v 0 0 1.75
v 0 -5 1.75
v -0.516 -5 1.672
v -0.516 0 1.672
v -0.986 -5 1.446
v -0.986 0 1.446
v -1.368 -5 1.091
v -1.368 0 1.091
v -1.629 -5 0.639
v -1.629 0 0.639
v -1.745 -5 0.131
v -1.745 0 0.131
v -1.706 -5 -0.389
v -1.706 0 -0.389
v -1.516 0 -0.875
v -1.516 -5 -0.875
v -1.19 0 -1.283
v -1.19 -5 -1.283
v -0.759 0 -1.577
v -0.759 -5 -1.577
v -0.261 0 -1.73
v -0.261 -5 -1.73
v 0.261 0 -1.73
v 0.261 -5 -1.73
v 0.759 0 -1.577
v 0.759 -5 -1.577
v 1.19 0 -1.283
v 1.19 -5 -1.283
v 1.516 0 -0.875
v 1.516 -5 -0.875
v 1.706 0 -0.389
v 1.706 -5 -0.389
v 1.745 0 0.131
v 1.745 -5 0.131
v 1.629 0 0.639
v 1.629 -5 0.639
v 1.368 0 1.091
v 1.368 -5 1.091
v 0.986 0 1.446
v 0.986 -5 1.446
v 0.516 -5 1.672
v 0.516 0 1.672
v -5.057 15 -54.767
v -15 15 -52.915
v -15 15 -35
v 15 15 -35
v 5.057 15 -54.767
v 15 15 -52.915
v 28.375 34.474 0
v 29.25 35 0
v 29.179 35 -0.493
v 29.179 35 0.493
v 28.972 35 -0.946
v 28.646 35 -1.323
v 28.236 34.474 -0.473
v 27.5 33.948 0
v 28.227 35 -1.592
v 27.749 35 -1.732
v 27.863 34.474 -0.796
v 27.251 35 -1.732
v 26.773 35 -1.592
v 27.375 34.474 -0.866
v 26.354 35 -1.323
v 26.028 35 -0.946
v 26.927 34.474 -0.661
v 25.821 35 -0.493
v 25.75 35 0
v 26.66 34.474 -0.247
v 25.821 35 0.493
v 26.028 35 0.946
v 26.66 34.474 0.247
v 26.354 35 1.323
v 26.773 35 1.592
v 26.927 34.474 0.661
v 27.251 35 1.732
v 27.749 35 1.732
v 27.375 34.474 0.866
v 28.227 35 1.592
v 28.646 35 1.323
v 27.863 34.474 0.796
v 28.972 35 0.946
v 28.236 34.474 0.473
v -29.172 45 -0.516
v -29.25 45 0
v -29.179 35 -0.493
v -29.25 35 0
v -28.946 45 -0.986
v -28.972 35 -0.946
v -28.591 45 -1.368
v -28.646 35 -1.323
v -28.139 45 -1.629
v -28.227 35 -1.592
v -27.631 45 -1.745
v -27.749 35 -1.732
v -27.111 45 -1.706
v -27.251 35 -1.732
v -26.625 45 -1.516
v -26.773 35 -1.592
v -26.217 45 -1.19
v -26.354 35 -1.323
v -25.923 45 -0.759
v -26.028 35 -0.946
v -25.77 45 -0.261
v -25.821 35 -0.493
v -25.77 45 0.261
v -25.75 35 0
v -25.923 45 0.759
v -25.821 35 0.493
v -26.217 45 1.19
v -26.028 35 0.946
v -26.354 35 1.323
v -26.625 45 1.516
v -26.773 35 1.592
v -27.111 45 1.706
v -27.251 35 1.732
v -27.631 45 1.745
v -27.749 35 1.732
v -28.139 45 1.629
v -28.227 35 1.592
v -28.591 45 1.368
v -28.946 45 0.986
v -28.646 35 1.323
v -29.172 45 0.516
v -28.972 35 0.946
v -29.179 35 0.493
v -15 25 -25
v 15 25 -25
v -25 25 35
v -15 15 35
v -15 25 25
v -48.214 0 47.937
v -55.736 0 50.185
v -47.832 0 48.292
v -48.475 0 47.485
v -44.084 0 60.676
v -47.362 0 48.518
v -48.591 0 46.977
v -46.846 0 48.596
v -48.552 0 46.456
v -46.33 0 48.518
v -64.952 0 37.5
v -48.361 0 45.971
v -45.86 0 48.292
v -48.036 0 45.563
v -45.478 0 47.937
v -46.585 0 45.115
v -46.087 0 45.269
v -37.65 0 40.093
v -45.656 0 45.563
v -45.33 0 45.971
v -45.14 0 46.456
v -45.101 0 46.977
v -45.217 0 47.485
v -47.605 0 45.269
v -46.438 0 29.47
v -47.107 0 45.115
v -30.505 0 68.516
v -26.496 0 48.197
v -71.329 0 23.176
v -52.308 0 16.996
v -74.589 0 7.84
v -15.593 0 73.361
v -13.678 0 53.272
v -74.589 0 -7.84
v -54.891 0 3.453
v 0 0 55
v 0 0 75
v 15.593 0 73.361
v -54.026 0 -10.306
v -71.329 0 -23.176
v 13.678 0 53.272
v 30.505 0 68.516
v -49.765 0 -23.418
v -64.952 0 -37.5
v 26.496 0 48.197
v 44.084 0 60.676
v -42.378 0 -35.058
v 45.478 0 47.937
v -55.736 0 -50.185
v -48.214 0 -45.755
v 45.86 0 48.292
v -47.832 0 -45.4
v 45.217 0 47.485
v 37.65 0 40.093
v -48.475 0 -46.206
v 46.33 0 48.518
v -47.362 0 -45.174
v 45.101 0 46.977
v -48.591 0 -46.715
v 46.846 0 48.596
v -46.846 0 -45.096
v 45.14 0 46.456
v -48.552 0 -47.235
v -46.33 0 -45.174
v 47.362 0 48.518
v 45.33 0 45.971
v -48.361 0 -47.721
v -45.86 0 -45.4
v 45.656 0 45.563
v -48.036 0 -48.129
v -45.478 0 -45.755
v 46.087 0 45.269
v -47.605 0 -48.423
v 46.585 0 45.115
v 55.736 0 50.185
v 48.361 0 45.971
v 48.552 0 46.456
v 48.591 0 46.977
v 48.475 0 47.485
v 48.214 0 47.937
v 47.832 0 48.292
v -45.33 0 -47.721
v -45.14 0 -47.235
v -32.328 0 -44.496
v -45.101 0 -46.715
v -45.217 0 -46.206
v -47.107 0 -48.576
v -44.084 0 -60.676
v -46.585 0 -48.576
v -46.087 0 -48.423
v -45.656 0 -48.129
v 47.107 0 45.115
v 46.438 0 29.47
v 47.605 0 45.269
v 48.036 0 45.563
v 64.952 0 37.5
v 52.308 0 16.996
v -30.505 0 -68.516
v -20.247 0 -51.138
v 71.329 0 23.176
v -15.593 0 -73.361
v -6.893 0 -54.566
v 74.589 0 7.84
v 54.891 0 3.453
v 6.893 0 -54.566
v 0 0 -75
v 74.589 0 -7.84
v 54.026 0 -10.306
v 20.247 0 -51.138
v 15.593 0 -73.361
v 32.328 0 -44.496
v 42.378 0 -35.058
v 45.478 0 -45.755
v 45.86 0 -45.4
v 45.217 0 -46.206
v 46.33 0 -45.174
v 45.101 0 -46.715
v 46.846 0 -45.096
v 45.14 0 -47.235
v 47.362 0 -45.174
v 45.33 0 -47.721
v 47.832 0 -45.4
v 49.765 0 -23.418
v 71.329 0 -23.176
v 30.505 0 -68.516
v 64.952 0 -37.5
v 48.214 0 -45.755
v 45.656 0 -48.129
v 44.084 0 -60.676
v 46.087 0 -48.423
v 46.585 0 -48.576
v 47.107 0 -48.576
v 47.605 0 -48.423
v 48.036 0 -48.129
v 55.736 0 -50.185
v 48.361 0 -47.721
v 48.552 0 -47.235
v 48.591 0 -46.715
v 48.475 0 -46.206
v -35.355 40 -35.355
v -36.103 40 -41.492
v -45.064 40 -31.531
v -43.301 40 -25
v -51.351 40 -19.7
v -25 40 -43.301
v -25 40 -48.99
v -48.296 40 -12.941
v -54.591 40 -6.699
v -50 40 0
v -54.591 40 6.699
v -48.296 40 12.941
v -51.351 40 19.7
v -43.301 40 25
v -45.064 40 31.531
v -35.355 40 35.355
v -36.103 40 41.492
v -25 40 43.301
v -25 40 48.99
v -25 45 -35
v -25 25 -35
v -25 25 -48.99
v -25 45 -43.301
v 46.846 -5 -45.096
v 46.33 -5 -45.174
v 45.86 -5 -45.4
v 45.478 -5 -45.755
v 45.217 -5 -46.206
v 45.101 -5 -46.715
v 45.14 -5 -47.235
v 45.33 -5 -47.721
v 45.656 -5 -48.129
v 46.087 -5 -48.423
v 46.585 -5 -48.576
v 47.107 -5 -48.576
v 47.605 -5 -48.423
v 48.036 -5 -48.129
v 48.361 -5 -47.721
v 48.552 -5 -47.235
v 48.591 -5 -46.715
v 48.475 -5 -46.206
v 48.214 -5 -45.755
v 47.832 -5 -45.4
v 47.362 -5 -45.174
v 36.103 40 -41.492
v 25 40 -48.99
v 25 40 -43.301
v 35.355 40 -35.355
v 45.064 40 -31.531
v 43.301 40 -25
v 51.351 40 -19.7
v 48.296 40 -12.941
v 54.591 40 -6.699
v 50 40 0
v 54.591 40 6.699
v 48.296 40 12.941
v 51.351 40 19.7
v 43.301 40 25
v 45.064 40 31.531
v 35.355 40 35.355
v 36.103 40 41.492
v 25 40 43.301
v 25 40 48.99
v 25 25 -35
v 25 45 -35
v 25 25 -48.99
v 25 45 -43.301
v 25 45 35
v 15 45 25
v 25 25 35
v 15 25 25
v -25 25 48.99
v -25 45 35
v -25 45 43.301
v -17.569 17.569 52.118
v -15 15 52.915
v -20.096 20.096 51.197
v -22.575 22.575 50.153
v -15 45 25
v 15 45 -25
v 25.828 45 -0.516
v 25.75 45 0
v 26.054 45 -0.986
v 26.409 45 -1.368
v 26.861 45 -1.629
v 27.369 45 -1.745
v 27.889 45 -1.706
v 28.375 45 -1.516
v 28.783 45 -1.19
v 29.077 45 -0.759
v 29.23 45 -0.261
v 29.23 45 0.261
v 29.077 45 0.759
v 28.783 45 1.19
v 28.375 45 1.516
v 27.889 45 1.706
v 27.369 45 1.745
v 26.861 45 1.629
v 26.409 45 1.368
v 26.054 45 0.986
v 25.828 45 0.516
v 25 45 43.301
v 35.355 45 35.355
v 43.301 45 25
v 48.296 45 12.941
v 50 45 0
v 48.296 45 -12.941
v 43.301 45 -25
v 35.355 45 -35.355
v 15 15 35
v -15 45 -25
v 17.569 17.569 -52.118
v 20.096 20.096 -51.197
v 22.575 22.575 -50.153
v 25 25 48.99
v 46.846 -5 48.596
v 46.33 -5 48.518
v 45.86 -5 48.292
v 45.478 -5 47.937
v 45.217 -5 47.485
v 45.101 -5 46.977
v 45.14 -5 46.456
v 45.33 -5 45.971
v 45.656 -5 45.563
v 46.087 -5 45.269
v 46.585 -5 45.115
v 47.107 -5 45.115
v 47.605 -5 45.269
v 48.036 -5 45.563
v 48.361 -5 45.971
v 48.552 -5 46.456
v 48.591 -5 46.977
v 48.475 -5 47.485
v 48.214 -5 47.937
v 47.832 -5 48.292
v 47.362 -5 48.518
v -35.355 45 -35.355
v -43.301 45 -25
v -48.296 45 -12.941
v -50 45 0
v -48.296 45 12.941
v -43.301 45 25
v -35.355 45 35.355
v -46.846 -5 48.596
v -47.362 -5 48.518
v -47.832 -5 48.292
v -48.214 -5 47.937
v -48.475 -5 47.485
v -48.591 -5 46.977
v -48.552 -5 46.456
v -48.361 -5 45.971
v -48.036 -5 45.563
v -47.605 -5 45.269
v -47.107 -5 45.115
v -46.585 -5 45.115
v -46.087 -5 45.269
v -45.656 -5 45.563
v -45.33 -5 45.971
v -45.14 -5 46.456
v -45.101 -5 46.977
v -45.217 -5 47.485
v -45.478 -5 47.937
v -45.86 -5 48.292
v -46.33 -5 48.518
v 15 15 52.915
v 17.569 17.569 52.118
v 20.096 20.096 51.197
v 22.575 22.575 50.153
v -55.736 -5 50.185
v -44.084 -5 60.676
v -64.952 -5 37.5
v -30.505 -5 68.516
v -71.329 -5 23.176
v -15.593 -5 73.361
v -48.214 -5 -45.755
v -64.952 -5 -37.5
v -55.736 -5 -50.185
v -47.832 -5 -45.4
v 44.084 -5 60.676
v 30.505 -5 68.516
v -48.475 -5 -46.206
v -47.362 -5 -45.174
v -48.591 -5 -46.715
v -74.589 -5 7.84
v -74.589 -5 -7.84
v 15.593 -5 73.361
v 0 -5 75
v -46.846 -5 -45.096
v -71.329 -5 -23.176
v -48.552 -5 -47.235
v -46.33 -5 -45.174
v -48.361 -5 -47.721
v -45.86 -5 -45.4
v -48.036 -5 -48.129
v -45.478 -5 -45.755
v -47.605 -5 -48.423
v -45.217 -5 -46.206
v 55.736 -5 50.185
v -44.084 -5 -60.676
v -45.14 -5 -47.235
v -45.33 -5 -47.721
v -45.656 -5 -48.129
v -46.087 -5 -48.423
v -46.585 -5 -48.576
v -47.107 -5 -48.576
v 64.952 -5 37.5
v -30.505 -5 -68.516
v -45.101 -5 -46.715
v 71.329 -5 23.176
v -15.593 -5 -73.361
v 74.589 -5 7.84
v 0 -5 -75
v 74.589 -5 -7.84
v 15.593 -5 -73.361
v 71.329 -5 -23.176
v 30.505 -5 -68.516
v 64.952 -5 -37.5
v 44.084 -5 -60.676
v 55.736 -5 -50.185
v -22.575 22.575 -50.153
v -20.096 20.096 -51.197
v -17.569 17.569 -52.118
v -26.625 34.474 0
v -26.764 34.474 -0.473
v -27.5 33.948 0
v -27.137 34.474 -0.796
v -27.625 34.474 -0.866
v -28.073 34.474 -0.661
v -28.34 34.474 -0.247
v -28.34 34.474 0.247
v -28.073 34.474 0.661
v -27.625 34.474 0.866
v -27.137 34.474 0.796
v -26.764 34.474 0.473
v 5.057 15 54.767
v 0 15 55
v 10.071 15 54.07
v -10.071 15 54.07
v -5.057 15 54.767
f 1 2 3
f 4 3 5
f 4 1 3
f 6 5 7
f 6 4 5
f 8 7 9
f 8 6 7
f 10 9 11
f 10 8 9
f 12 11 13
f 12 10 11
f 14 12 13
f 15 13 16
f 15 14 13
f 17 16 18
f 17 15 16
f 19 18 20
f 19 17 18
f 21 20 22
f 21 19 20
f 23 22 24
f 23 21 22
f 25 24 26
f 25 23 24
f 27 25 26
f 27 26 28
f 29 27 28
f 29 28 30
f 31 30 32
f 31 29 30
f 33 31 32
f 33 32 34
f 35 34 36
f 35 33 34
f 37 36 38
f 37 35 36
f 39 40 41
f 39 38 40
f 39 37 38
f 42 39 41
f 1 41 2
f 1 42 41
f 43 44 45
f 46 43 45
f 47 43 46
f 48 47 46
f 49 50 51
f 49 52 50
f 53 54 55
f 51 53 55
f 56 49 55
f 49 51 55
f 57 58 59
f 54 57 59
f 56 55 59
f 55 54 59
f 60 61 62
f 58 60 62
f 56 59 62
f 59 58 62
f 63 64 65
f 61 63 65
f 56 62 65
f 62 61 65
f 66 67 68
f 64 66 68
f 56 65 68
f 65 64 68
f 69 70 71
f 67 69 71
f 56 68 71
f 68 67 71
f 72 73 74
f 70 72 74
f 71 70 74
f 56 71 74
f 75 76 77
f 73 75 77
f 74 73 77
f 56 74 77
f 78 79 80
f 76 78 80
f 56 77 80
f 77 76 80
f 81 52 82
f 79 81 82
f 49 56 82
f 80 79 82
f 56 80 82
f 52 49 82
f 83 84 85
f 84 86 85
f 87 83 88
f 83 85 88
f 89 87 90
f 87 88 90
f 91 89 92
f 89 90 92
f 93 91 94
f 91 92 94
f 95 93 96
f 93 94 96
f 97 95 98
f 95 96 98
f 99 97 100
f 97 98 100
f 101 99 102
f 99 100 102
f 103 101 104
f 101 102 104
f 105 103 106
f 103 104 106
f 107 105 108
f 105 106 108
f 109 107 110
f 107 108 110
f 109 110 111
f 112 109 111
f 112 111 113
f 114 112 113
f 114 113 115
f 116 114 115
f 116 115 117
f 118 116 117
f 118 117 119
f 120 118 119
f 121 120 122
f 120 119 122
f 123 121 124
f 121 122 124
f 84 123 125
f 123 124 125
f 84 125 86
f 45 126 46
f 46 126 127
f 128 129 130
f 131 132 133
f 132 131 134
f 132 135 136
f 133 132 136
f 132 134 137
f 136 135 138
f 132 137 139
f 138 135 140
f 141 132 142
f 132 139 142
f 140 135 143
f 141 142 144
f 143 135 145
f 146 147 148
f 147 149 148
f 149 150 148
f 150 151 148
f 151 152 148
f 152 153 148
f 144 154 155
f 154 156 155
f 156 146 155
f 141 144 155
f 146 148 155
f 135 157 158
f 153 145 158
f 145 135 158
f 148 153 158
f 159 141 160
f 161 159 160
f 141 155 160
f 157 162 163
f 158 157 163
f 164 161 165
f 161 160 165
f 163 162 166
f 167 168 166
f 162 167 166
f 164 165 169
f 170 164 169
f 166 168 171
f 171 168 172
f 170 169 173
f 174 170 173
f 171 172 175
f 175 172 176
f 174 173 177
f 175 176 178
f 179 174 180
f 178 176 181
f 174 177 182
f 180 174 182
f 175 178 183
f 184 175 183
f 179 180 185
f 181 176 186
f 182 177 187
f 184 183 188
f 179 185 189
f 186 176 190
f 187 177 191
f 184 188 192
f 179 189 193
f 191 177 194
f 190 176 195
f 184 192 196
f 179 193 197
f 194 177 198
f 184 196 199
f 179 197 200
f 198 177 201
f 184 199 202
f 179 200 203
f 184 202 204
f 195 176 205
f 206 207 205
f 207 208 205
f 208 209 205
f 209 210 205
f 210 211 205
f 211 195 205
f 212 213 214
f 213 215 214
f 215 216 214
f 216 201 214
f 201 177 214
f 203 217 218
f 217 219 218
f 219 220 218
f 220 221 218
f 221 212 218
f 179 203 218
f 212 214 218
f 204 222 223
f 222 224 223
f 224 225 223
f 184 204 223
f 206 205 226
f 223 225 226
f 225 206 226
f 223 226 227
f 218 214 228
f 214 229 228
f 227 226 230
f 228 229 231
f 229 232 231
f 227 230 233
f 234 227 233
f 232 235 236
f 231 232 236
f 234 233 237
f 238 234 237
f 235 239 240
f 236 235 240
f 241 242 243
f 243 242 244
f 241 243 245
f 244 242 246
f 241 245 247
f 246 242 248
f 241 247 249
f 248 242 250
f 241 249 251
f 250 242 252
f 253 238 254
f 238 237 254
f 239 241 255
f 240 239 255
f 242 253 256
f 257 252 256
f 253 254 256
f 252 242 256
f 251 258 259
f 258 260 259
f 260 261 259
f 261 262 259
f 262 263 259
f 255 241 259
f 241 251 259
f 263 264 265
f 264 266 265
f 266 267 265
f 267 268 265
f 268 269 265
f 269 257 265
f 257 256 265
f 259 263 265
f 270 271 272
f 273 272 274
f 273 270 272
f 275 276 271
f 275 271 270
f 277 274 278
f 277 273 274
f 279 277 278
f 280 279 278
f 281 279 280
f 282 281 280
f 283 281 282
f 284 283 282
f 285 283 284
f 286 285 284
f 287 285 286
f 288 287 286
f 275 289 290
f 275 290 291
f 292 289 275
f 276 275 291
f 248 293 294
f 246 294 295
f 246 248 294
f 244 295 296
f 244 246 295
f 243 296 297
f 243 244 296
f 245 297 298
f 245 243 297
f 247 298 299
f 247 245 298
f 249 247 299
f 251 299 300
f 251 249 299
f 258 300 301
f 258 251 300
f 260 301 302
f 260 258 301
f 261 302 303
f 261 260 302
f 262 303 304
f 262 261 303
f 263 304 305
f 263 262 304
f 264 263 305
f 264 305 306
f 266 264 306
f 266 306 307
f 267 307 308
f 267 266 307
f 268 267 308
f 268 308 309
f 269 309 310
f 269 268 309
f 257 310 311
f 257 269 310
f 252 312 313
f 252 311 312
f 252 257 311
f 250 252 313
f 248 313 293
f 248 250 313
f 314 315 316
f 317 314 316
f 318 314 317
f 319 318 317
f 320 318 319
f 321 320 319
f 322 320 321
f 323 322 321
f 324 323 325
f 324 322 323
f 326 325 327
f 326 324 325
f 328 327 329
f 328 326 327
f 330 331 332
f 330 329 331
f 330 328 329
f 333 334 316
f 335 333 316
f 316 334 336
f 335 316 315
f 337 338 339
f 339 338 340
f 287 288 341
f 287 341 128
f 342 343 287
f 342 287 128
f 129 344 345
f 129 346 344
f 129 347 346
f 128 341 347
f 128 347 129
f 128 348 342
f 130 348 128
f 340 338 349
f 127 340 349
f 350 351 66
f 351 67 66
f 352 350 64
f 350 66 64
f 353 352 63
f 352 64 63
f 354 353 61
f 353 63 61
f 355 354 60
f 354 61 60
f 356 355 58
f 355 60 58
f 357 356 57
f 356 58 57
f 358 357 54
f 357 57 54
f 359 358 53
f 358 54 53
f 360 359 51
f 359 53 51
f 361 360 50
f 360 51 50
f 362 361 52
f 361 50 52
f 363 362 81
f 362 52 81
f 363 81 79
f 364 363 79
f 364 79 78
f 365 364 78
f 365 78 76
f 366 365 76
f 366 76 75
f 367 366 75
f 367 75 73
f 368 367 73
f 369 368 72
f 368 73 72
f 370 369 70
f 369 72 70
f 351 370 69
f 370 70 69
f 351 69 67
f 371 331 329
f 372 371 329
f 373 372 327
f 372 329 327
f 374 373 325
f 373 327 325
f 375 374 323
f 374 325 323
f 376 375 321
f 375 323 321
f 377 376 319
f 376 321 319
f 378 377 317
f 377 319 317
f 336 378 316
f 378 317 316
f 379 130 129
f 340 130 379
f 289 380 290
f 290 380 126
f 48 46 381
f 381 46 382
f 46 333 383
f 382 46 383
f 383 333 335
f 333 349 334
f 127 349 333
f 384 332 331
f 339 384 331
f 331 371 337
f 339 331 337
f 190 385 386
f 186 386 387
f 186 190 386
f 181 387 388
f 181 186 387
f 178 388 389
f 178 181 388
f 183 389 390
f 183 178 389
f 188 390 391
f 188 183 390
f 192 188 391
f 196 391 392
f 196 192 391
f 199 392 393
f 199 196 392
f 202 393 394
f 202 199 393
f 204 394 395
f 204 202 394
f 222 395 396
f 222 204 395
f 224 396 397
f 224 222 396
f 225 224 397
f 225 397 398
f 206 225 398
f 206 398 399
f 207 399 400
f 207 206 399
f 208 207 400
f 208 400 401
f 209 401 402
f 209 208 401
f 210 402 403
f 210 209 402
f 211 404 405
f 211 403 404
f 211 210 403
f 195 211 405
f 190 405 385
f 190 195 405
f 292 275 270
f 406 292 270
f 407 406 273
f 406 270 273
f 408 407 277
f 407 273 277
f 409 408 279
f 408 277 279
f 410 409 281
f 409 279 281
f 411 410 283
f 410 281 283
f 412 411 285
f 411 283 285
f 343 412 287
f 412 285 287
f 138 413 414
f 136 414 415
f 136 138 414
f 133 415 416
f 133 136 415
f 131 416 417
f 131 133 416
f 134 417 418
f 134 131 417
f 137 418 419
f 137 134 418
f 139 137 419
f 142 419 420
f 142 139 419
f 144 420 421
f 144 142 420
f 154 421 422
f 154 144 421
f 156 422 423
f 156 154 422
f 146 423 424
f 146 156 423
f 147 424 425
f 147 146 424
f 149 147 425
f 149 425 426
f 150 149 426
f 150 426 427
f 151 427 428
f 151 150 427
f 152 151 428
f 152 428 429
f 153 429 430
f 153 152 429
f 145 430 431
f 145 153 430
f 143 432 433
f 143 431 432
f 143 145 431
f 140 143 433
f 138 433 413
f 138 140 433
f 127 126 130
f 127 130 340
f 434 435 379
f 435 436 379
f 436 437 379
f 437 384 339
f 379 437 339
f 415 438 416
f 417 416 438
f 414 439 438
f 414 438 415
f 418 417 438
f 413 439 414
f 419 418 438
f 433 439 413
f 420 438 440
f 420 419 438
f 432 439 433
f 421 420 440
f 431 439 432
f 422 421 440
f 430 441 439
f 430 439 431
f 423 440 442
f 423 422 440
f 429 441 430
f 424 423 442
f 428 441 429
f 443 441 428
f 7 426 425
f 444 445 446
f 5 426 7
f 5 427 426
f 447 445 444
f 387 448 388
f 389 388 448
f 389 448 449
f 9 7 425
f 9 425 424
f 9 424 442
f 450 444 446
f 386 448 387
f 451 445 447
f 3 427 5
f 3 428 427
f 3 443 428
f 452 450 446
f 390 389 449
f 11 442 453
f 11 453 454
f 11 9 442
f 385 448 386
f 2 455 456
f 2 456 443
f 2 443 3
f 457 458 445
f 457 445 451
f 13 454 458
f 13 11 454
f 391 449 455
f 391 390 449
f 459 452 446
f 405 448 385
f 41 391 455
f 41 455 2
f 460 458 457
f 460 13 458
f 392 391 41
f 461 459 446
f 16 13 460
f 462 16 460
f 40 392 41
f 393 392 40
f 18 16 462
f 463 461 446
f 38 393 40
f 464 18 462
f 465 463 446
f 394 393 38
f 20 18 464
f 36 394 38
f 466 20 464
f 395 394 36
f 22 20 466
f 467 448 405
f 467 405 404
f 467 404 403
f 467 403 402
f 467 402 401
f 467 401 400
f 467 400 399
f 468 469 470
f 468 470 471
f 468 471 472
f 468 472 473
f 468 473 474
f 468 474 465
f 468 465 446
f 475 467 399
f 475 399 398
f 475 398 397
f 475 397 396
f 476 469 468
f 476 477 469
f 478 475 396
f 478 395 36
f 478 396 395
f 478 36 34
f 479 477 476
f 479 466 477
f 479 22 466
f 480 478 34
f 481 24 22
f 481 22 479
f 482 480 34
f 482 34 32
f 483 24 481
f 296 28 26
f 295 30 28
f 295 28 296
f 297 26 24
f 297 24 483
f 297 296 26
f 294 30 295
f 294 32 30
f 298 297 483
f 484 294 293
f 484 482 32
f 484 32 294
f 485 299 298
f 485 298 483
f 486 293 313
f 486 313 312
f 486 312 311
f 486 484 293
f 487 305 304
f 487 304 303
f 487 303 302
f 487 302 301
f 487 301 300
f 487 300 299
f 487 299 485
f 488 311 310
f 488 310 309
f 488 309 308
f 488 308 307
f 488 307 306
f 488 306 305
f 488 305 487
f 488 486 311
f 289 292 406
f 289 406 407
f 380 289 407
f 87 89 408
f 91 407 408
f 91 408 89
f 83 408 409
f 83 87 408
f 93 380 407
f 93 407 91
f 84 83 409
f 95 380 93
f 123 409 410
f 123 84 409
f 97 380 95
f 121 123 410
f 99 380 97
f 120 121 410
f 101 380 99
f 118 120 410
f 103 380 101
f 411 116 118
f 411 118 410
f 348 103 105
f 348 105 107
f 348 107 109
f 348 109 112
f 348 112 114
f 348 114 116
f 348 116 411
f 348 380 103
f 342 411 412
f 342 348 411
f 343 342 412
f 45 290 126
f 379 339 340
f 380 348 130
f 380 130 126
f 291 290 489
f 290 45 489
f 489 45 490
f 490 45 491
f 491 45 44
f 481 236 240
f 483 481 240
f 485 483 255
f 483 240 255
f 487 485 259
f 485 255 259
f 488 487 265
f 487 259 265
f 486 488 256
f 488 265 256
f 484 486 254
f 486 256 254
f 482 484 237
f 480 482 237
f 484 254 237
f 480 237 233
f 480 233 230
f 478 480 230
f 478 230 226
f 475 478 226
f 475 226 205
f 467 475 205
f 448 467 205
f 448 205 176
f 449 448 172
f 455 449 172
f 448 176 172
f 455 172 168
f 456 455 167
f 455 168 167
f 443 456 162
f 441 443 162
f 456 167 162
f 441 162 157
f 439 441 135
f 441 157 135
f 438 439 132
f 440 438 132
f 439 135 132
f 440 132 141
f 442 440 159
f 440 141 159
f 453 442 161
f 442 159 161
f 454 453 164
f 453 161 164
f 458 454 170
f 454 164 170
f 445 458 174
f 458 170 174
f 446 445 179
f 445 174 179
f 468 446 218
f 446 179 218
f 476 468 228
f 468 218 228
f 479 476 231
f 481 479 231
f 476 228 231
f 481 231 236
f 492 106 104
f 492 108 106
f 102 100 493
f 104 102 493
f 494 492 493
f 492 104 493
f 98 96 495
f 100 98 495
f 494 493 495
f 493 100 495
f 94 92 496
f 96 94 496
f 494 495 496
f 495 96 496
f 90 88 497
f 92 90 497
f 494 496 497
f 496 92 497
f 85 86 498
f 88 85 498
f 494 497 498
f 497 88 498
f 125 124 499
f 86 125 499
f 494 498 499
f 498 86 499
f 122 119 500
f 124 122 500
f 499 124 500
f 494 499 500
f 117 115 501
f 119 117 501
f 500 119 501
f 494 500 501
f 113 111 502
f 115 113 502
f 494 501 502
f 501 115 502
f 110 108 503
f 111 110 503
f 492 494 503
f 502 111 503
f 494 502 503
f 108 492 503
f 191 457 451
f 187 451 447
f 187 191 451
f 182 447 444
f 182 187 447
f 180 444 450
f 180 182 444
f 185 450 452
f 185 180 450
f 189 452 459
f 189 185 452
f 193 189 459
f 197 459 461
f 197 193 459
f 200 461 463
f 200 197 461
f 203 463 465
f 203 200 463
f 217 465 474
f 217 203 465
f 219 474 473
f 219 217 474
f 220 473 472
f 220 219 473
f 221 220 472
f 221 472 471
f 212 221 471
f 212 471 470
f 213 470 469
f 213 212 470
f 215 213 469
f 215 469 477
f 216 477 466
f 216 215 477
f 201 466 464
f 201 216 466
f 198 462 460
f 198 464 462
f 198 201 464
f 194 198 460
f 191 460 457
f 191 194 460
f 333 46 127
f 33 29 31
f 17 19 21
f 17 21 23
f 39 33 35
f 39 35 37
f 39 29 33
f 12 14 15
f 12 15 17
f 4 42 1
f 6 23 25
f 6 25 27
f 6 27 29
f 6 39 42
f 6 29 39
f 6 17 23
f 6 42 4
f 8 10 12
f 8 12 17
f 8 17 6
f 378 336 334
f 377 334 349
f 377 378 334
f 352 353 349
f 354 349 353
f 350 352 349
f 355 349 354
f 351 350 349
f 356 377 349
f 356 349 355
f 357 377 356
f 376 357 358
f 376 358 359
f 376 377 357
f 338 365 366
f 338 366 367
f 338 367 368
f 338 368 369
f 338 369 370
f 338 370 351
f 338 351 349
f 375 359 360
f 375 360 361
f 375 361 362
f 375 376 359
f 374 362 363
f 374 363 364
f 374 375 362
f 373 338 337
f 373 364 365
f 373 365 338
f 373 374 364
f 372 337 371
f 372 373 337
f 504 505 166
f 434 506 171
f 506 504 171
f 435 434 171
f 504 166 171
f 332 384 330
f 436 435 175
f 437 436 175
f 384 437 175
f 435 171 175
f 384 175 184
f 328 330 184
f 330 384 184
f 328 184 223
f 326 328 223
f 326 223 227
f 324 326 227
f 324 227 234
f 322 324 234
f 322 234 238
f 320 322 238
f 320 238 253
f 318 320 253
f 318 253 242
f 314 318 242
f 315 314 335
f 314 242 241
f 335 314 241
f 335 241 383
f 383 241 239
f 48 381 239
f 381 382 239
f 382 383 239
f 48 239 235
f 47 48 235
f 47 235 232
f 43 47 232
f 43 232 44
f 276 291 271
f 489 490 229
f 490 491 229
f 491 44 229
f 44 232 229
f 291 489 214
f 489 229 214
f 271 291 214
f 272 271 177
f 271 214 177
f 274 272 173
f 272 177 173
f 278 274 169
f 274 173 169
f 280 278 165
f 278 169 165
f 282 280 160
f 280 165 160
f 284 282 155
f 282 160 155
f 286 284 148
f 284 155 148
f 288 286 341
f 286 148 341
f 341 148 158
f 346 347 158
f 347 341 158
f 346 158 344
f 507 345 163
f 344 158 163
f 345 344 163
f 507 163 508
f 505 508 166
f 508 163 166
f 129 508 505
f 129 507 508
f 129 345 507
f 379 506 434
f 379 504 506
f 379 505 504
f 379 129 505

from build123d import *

# Parameters (mm, degrees)
SKETCH1_R                           = 55
BOSS_EXTRUDE1_DEPTH                 = 40
SKETCH2_R                           = 75
BOSS_EXTRUDE2_DEPTH                 = 5
SKETCH6_R                           = 50
BOSS_EXTRUDE3_DEPTH                 = 5
F_3_5_3_5_DIAMETER_HOLE1_D          = 3.5
F_3_5_3_5_DIAMETER_HOLE1_DEPTH      = 10
F_3_5_3_5_DIAMETER_HOLE1_TIP        = 1.051506083
SKETCH7_W                           = 50
SKETCH7_H                           = 60
CUT_EXTRUDE1_DEPTH                  = 30
CHAMFER1_SIZE                       = 10
SKETCH8_W                           = 30
SKETCH8_H                           = 50
CUT_EXTRUDE2_DEPTH                  = 20
F_3_5_3_5_DIAMETER_HOLE2_AT_2_COUNT = 2
F_3_5_3_5_DIAMETER_HOLE2_AT_2_PITCH = 66.25
F_3_5_3_5_DIAMETER_HOLE2_AT_3_COUNT = 2
F_3_5_3_5_DIAMETER_HOLE2_AT_3_PITCH = 66.25
F_3_5_3_5_DIAMETER_HOLE2_AT_4_COUNT = 2
F_3_5_3_5_DIAMETER_HOLE2_AT_4_PITCH = 66.25
F_3_5_3_5_DIAMETER_HOLE2_AT_5_COUNT = 2
F_3_5_3_5_DIAMETER_HOLE2_AT_5_PITCH = 66.25


with BuildPart() as part:
    # Sketch1 → Boss-Extrude1 (new body)
    with BuildSketch(Plane(origin=(0, 0, 0), x_dir=(1, 0, 0), z_dir=(0, 1, 0))):
        with Locations(Location((0, 0, 0), (0, 0, 270))):
            Circle(SKETCH1_R)
    extrude(amount=BOSS_EXTRUDE1_DEPTH)

    # Sketch2 → Boss-Extrude2 (add)
    with BuildSketch(Plane.XZ):
        with Locations(Location((0, 0, 0), (0, 0, 270))):
            Circle(SKETCH2_R)
    extrude(amount=BOSS_EXTRUDE2_DEPTH)

    # Sketch6 → Boss-Extrude3 (add)
    with BuildSketch(Plane(origin=(0, 40, 0), x_dir=(1, 0, 0), z_dir=(0, 1, 0))):
        with Locations(Location((0, 0, 0), (0, 0, 270))):
            Circle(SKETCH6_R)
    extrude(amount=BOSS_EXTRUDE3_DEPTH)

    # Ø3.5 (3.5) Diameter Hole1
    with Locations(Plane(origin=(-12.746034072, 45, -7.868896946), x_dir=(1, 0, 0), z_dir=(0, 1, 0))):
        with Locations((-14.753965928, -7.868896946), (40.246034072, -7.868896946)):
            Hole(F_3_5_3_5_DIAMETER_HOLE1_D / 2, depth=F_3_5_3_5_DIAMETER_HOLE1_DEPTH)
            with Locations((0, 0, -(F_3_5_3_5_DIAMETER_HOLE1_DEPTH + F_3_5_3_5_DIAMETER_HOLE1_TIP / 2))):  # 118° drill point
                Cone(0, F_3_5_3_5_DIAMETER_HOLE1_D / 2, F_3_5_3_5_DIAMETER_HOLE1_TIP, mode=Mode.SUBTRACT)

    # Sketch7 → Cut-Extrude1 (cut)
    with BuildSketch(Plane(origin=(0, 45, 0), x_dir=(1, 0, 0), z_dir=(0, 1, 0))):
        with Locations((0, 55)):
            Rectangle(SKETCH7_W, SKETCH7_H)
        with Locations((0, -55)):
            Rectangle(SKETCH7_W, SKETCH7_H)
    extrude(amount=-CUT_EXTRUDE1_DEPTH, mode=Mode.SUBTRACT)

    # Chamfer1
    chamfer1_edges = [part.edges().sort_by_distance(p)[0] for p in [
        (25, 15, -36.994897428),
        (-25, 15, -36.994897428),
        (-25, 30, -25),
        (0, 15, -25),
        (25, 30, -25),
        (25, 15, 36.994897428),
        (25, 30, 25),
        (-25, 15, 36.994897428),
        (0, 15, 25),
        (-25, 30, 25),
    ]]
    chamfer(chamfer1_edges, length=CHAMFER1_SIZE)

    # Sketch8 → Cut-Extrude2 (cut)
    with BuildSketch(Plane(origin=(0, 45, 0), x_dir=(1, 0, 0), z_dir=(0, 1, 0))):
        Rectangle(SKETCH8_W, SKETCH8_H)
    extrude(amount=-CUT_EXTRUDE2_DEPTH, mode=Mode.SUBTRACT)

    # Sketch9 → Ø3.5 (3.5) Diameter Hole2 (revolve, cut)
    with BuildSketch(Plane(origin=(0, 0, 0), x_dir=(0, 0, 1), z_dir=(1, 0, 0))):
        Polygon((0, 0), (0, 11.051506083), (1.75, 10), (1.75, 0), align=None)
    f_3_5_3_5_diameter_hole2 = revolve(axis=Axis((0, 6.35, 0), (0, -1, 0)), mode=Mode.SUBTRACT)

    # Ø3.5 (3.5) Diameter Hole2 at 2: Ø3.5 (3.5) Diameter Hole2 ×2
    with Locations(*[Vector(0.7071067811865477, 0, 0.7071067811865475) * (i * F_3_5_3_5_DIAMETER_HOLE2_AT_2_PITCH) for i in range(1, F_3_5_3_5_DIAMETER_HOLE2_AT_2_COUNT)]):
        add(f_3_5_3_5_diameter_hole2, mode=Mode.SUBTRACT)

    # Ø3.5 (3.5) Diameter Hole2 at 3: Ø3.5 (3.5) Diameter Hole2 ×2
    with Locations(*[Vector(-0.7071067811865478, 0, -0.7071067811865474) * (i * F_3_5_3_5_DIAMETER_HOLE2_AT_3_PITCH) for i in range(1, F_3_5_3_5_DIAMETER_HOLE2_AT_3_COUNT)]):
        add(f_3_5_3_5_diameter_hole2, mode=Mode.SUBTRACT)

    # Ø3.5 (3.5) Diameter Hole2 at 4: Ø3.5 (3.5) Diameter Hole2 ×2
    with Locations(*[Vector(-0.7071067811865476, 0, 0.7071067811865476) * (i * F_3_5_3_5_DIAMETER_HOLE2_AT_4_PITCH) for i in range(1, F_3_5_3_5_DIAMETER_HOLE2_AT_4_COUNT)]):
        add(f_3_5_3_5_diameter_hole2, mode=Mode.SUBTRACT)

    # Ø3.5 (3.5) Diameter Hole2 at 5: Ø3.5 (3.5) Diameter Hole2 ×2
    with Locations(*[Vector(0.7071067811865476, 0, -0.7071067811865476) * (i * F_3_5_3_5_DIAMETER_HOLE2_AT_5_PITCH) for i in range(1, F_3_5_3_5_DIAMETER_HOLE2_AT_5_COUNT)]):
        add(f_3_5_3_5_diameter_hole2, mode=Mode.SUBTRACT)


solid = part.part
